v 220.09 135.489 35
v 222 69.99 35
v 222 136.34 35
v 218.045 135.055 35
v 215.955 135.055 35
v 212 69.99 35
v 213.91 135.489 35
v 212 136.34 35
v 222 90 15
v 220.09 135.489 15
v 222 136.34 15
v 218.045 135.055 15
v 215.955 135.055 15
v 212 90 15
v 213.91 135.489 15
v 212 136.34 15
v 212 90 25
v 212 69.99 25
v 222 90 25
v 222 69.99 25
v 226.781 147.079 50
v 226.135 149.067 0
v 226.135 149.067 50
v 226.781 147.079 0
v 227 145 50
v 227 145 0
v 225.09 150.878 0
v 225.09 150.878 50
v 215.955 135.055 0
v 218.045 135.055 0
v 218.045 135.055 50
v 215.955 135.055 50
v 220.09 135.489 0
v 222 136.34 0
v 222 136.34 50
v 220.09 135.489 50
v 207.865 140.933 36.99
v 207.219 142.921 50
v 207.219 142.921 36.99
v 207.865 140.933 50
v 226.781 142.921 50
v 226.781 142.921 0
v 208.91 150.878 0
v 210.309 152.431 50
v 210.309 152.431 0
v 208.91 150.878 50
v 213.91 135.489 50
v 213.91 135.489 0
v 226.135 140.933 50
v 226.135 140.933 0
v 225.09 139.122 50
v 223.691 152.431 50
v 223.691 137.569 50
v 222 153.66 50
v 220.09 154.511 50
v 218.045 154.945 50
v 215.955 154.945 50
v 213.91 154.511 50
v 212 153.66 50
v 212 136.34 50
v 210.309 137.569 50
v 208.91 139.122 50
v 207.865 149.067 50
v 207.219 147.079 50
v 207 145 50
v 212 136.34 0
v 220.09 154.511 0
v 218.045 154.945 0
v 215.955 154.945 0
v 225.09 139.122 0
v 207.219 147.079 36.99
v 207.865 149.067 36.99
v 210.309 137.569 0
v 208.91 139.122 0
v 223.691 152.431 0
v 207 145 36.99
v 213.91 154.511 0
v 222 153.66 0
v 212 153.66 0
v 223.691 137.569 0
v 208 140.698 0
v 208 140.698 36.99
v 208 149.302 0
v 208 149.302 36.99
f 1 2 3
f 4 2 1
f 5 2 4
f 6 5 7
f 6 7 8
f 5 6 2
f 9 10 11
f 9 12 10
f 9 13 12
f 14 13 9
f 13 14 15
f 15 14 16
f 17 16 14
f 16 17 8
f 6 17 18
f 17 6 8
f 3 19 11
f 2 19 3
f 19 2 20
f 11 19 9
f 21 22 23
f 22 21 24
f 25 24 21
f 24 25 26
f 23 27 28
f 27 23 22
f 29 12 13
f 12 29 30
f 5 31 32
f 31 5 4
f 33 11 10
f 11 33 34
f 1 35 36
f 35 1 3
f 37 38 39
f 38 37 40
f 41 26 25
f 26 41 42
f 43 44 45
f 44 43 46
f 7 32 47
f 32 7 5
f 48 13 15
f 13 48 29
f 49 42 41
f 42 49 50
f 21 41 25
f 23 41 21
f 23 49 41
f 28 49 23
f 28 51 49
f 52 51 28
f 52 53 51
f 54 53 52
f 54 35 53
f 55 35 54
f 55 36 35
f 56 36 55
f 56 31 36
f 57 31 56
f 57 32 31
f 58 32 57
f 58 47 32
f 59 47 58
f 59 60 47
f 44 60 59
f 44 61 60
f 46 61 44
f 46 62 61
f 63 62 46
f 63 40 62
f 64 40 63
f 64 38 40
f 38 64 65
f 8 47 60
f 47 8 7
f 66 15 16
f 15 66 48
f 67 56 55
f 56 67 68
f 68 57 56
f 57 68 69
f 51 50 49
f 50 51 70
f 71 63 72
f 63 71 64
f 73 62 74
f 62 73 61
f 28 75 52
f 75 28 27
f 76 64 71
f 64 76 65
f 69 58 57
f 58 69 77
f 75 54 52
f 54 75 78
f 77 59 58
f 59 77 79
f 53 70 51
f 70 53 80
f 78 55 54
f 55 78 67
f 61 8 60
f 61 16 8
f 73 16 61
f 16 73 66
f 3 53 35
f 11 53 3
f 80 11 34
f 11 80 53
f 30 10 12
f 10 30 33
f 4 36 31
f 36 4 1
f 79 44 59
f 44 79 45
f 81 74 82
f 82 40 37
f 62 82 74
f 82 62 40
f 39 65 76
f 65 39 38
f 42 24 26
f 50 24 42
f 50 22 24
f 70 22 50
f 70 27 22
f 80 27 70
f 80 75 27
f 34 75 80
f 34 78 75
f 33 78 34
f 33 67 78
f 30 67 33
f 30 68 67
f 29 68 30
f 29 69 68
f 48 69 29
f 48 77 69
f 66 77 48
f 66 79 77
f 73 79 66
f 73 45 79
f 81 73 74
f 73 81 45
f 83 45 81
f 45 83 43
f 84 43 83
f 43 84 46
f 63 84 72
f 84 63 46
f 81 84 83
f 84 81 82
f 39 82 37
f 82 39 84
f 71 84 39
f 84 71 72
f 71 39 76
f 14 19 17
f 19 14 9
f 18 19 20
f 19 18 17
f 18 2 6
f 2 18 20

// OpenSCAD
post_height = 50;
post_radius = 10;


rail_depth = 10;
rail_height = 20;
printer_feet_width = 217;
printer_feet_depth = 145;
front_rail_length = printer_feet_width;
side_rail_length = printer_feet_depth;

module post() {
    color("black", 1) cylinder(h = post_height, r = post_radius, center = false);
}

module rail(length) {
  cube([length, rail_depth, rail_height]);
}

module printer_feet() {
    color("green", 1)
        translate([0, 0, post_height]) cube([217, 145, 10]);
}

module mac_mini() {
    color("red", 1) translate([post_radius, post_radius, -.01]) cube([198,198, 37]);
}

module stand() {

    translate([0, printer_feet_depth, 0]) post(); 

    translate([rail_depth/2, 0, (post_height - rail_height)/2]) rotate([0, 0, 90]) rail(side_rail_length);

    post();

    translate([0, -post_radius/2, (post_height - rail_height)/2]) rail(front_rail_length);

    translate([printer_feet_width, 0, 0]) post();

    translate([front_rail_length+post_radius/2, 0, (post_height - rail_height)/2]) rotate([0, 0, 90]) rail(side_rail_length);

    translate([printer_feet_width, printer_feet_depth, 0]) post();
}

//stand();

module stand_with_cutout() {
    difference() {
        stand();
        mac_mini();
    }
}

//stand_with_cutout();

//printer_feet();
//mac_mini();

total_width = front_rail_length+post_radius+post_radius;
total_depth = side_rail_length+post_radius+post_radius;
total_height = post_height;
echo(total_width);
echo(total_depth);
echo(total_height);

//color("blue", .5) translate([-post_radius, -post_radius, 0]) cube([total_width, total_depth, total_height]);

module front_left_slice() {
    difference() {
        intersection() {
            stand_with_cutout();
            color("blue", .5) translate([-post_radius, -post_radius, -.01]) cube([100, 100, total_height+.02]);
        }
        color("blue", .5)  translate([100-40-post_radius, -rail_depth/2-.01, post_height/2]) cube([40+.01, rail_depth+.02, rail_height/2+.02]);
    }
}

module back_left_slice() {
    intersection() {
        stand_with_cutout();
        color("blue", .5) translate([-post_radius, -post_radius+100, -.01]) cube([100, 100, total_height+.02]);
    }
    translate([-rail_depth/2-2+.01, -post_radius+100-20, post_height/2-10]) cube([2, 40, rail_height]);
    translate([-rail_depth/2-2+.01, -post_radius+100-20, post_height/2-10-2]) cube([rail_depth+2, 40, 2]);

}

module front_right_slice() {
    difference() {
        intersection() {
            stand_with_cutout();
            color("blue", .5) translate([total_width-post_radius-100, -post_radius, -.01]) cube([100, 100, total_height+.02]);
        }
        color("blue", .5)  translate([total_width-post_radius-100-.01, -rail_depth/2-.01, post_height/2]) cube([20+.01, rail_depth+.02, rail_height/2+.02]);
        color("blue", .5)  translate([front_rail_length+post_radius/2-rail_depth-.01, 100-post_radius-20, post_height/2]) cube([rail_depth+.02, 20, rail_height/2+.02]);
    }     
}

module front_middle_slice() {
    difference() {
        intersection() {
            stand_with_cutout();
            color("blue", .1) translate([100-post_radius-40, -post_radius, -.01]) cube([total_width-post_radius*2-100-20, post_radius*2, total_height+.02]);
        }
        front_left_slice();
        front_right_slice();
    }
}

module back_right_slice() {
        intersection() {
            stand_with_cutout();
            color("blue", .5) translate([total_width-post_radius-100, 100-post_radius, -.01]) cube([100, 100, total_height+.02]);
        }
        translate([front_rail_length-post_radius/2, 100-post_radius-20-.01, (post_height - rail_height)/2+rail_height/2]) cube([rail_depth, 20+.02, rail_height/2]);
}


//back_left_slice();
//front_left_slice();
//front_middle_slice();
//front_right_slice();
back_right_slice();
